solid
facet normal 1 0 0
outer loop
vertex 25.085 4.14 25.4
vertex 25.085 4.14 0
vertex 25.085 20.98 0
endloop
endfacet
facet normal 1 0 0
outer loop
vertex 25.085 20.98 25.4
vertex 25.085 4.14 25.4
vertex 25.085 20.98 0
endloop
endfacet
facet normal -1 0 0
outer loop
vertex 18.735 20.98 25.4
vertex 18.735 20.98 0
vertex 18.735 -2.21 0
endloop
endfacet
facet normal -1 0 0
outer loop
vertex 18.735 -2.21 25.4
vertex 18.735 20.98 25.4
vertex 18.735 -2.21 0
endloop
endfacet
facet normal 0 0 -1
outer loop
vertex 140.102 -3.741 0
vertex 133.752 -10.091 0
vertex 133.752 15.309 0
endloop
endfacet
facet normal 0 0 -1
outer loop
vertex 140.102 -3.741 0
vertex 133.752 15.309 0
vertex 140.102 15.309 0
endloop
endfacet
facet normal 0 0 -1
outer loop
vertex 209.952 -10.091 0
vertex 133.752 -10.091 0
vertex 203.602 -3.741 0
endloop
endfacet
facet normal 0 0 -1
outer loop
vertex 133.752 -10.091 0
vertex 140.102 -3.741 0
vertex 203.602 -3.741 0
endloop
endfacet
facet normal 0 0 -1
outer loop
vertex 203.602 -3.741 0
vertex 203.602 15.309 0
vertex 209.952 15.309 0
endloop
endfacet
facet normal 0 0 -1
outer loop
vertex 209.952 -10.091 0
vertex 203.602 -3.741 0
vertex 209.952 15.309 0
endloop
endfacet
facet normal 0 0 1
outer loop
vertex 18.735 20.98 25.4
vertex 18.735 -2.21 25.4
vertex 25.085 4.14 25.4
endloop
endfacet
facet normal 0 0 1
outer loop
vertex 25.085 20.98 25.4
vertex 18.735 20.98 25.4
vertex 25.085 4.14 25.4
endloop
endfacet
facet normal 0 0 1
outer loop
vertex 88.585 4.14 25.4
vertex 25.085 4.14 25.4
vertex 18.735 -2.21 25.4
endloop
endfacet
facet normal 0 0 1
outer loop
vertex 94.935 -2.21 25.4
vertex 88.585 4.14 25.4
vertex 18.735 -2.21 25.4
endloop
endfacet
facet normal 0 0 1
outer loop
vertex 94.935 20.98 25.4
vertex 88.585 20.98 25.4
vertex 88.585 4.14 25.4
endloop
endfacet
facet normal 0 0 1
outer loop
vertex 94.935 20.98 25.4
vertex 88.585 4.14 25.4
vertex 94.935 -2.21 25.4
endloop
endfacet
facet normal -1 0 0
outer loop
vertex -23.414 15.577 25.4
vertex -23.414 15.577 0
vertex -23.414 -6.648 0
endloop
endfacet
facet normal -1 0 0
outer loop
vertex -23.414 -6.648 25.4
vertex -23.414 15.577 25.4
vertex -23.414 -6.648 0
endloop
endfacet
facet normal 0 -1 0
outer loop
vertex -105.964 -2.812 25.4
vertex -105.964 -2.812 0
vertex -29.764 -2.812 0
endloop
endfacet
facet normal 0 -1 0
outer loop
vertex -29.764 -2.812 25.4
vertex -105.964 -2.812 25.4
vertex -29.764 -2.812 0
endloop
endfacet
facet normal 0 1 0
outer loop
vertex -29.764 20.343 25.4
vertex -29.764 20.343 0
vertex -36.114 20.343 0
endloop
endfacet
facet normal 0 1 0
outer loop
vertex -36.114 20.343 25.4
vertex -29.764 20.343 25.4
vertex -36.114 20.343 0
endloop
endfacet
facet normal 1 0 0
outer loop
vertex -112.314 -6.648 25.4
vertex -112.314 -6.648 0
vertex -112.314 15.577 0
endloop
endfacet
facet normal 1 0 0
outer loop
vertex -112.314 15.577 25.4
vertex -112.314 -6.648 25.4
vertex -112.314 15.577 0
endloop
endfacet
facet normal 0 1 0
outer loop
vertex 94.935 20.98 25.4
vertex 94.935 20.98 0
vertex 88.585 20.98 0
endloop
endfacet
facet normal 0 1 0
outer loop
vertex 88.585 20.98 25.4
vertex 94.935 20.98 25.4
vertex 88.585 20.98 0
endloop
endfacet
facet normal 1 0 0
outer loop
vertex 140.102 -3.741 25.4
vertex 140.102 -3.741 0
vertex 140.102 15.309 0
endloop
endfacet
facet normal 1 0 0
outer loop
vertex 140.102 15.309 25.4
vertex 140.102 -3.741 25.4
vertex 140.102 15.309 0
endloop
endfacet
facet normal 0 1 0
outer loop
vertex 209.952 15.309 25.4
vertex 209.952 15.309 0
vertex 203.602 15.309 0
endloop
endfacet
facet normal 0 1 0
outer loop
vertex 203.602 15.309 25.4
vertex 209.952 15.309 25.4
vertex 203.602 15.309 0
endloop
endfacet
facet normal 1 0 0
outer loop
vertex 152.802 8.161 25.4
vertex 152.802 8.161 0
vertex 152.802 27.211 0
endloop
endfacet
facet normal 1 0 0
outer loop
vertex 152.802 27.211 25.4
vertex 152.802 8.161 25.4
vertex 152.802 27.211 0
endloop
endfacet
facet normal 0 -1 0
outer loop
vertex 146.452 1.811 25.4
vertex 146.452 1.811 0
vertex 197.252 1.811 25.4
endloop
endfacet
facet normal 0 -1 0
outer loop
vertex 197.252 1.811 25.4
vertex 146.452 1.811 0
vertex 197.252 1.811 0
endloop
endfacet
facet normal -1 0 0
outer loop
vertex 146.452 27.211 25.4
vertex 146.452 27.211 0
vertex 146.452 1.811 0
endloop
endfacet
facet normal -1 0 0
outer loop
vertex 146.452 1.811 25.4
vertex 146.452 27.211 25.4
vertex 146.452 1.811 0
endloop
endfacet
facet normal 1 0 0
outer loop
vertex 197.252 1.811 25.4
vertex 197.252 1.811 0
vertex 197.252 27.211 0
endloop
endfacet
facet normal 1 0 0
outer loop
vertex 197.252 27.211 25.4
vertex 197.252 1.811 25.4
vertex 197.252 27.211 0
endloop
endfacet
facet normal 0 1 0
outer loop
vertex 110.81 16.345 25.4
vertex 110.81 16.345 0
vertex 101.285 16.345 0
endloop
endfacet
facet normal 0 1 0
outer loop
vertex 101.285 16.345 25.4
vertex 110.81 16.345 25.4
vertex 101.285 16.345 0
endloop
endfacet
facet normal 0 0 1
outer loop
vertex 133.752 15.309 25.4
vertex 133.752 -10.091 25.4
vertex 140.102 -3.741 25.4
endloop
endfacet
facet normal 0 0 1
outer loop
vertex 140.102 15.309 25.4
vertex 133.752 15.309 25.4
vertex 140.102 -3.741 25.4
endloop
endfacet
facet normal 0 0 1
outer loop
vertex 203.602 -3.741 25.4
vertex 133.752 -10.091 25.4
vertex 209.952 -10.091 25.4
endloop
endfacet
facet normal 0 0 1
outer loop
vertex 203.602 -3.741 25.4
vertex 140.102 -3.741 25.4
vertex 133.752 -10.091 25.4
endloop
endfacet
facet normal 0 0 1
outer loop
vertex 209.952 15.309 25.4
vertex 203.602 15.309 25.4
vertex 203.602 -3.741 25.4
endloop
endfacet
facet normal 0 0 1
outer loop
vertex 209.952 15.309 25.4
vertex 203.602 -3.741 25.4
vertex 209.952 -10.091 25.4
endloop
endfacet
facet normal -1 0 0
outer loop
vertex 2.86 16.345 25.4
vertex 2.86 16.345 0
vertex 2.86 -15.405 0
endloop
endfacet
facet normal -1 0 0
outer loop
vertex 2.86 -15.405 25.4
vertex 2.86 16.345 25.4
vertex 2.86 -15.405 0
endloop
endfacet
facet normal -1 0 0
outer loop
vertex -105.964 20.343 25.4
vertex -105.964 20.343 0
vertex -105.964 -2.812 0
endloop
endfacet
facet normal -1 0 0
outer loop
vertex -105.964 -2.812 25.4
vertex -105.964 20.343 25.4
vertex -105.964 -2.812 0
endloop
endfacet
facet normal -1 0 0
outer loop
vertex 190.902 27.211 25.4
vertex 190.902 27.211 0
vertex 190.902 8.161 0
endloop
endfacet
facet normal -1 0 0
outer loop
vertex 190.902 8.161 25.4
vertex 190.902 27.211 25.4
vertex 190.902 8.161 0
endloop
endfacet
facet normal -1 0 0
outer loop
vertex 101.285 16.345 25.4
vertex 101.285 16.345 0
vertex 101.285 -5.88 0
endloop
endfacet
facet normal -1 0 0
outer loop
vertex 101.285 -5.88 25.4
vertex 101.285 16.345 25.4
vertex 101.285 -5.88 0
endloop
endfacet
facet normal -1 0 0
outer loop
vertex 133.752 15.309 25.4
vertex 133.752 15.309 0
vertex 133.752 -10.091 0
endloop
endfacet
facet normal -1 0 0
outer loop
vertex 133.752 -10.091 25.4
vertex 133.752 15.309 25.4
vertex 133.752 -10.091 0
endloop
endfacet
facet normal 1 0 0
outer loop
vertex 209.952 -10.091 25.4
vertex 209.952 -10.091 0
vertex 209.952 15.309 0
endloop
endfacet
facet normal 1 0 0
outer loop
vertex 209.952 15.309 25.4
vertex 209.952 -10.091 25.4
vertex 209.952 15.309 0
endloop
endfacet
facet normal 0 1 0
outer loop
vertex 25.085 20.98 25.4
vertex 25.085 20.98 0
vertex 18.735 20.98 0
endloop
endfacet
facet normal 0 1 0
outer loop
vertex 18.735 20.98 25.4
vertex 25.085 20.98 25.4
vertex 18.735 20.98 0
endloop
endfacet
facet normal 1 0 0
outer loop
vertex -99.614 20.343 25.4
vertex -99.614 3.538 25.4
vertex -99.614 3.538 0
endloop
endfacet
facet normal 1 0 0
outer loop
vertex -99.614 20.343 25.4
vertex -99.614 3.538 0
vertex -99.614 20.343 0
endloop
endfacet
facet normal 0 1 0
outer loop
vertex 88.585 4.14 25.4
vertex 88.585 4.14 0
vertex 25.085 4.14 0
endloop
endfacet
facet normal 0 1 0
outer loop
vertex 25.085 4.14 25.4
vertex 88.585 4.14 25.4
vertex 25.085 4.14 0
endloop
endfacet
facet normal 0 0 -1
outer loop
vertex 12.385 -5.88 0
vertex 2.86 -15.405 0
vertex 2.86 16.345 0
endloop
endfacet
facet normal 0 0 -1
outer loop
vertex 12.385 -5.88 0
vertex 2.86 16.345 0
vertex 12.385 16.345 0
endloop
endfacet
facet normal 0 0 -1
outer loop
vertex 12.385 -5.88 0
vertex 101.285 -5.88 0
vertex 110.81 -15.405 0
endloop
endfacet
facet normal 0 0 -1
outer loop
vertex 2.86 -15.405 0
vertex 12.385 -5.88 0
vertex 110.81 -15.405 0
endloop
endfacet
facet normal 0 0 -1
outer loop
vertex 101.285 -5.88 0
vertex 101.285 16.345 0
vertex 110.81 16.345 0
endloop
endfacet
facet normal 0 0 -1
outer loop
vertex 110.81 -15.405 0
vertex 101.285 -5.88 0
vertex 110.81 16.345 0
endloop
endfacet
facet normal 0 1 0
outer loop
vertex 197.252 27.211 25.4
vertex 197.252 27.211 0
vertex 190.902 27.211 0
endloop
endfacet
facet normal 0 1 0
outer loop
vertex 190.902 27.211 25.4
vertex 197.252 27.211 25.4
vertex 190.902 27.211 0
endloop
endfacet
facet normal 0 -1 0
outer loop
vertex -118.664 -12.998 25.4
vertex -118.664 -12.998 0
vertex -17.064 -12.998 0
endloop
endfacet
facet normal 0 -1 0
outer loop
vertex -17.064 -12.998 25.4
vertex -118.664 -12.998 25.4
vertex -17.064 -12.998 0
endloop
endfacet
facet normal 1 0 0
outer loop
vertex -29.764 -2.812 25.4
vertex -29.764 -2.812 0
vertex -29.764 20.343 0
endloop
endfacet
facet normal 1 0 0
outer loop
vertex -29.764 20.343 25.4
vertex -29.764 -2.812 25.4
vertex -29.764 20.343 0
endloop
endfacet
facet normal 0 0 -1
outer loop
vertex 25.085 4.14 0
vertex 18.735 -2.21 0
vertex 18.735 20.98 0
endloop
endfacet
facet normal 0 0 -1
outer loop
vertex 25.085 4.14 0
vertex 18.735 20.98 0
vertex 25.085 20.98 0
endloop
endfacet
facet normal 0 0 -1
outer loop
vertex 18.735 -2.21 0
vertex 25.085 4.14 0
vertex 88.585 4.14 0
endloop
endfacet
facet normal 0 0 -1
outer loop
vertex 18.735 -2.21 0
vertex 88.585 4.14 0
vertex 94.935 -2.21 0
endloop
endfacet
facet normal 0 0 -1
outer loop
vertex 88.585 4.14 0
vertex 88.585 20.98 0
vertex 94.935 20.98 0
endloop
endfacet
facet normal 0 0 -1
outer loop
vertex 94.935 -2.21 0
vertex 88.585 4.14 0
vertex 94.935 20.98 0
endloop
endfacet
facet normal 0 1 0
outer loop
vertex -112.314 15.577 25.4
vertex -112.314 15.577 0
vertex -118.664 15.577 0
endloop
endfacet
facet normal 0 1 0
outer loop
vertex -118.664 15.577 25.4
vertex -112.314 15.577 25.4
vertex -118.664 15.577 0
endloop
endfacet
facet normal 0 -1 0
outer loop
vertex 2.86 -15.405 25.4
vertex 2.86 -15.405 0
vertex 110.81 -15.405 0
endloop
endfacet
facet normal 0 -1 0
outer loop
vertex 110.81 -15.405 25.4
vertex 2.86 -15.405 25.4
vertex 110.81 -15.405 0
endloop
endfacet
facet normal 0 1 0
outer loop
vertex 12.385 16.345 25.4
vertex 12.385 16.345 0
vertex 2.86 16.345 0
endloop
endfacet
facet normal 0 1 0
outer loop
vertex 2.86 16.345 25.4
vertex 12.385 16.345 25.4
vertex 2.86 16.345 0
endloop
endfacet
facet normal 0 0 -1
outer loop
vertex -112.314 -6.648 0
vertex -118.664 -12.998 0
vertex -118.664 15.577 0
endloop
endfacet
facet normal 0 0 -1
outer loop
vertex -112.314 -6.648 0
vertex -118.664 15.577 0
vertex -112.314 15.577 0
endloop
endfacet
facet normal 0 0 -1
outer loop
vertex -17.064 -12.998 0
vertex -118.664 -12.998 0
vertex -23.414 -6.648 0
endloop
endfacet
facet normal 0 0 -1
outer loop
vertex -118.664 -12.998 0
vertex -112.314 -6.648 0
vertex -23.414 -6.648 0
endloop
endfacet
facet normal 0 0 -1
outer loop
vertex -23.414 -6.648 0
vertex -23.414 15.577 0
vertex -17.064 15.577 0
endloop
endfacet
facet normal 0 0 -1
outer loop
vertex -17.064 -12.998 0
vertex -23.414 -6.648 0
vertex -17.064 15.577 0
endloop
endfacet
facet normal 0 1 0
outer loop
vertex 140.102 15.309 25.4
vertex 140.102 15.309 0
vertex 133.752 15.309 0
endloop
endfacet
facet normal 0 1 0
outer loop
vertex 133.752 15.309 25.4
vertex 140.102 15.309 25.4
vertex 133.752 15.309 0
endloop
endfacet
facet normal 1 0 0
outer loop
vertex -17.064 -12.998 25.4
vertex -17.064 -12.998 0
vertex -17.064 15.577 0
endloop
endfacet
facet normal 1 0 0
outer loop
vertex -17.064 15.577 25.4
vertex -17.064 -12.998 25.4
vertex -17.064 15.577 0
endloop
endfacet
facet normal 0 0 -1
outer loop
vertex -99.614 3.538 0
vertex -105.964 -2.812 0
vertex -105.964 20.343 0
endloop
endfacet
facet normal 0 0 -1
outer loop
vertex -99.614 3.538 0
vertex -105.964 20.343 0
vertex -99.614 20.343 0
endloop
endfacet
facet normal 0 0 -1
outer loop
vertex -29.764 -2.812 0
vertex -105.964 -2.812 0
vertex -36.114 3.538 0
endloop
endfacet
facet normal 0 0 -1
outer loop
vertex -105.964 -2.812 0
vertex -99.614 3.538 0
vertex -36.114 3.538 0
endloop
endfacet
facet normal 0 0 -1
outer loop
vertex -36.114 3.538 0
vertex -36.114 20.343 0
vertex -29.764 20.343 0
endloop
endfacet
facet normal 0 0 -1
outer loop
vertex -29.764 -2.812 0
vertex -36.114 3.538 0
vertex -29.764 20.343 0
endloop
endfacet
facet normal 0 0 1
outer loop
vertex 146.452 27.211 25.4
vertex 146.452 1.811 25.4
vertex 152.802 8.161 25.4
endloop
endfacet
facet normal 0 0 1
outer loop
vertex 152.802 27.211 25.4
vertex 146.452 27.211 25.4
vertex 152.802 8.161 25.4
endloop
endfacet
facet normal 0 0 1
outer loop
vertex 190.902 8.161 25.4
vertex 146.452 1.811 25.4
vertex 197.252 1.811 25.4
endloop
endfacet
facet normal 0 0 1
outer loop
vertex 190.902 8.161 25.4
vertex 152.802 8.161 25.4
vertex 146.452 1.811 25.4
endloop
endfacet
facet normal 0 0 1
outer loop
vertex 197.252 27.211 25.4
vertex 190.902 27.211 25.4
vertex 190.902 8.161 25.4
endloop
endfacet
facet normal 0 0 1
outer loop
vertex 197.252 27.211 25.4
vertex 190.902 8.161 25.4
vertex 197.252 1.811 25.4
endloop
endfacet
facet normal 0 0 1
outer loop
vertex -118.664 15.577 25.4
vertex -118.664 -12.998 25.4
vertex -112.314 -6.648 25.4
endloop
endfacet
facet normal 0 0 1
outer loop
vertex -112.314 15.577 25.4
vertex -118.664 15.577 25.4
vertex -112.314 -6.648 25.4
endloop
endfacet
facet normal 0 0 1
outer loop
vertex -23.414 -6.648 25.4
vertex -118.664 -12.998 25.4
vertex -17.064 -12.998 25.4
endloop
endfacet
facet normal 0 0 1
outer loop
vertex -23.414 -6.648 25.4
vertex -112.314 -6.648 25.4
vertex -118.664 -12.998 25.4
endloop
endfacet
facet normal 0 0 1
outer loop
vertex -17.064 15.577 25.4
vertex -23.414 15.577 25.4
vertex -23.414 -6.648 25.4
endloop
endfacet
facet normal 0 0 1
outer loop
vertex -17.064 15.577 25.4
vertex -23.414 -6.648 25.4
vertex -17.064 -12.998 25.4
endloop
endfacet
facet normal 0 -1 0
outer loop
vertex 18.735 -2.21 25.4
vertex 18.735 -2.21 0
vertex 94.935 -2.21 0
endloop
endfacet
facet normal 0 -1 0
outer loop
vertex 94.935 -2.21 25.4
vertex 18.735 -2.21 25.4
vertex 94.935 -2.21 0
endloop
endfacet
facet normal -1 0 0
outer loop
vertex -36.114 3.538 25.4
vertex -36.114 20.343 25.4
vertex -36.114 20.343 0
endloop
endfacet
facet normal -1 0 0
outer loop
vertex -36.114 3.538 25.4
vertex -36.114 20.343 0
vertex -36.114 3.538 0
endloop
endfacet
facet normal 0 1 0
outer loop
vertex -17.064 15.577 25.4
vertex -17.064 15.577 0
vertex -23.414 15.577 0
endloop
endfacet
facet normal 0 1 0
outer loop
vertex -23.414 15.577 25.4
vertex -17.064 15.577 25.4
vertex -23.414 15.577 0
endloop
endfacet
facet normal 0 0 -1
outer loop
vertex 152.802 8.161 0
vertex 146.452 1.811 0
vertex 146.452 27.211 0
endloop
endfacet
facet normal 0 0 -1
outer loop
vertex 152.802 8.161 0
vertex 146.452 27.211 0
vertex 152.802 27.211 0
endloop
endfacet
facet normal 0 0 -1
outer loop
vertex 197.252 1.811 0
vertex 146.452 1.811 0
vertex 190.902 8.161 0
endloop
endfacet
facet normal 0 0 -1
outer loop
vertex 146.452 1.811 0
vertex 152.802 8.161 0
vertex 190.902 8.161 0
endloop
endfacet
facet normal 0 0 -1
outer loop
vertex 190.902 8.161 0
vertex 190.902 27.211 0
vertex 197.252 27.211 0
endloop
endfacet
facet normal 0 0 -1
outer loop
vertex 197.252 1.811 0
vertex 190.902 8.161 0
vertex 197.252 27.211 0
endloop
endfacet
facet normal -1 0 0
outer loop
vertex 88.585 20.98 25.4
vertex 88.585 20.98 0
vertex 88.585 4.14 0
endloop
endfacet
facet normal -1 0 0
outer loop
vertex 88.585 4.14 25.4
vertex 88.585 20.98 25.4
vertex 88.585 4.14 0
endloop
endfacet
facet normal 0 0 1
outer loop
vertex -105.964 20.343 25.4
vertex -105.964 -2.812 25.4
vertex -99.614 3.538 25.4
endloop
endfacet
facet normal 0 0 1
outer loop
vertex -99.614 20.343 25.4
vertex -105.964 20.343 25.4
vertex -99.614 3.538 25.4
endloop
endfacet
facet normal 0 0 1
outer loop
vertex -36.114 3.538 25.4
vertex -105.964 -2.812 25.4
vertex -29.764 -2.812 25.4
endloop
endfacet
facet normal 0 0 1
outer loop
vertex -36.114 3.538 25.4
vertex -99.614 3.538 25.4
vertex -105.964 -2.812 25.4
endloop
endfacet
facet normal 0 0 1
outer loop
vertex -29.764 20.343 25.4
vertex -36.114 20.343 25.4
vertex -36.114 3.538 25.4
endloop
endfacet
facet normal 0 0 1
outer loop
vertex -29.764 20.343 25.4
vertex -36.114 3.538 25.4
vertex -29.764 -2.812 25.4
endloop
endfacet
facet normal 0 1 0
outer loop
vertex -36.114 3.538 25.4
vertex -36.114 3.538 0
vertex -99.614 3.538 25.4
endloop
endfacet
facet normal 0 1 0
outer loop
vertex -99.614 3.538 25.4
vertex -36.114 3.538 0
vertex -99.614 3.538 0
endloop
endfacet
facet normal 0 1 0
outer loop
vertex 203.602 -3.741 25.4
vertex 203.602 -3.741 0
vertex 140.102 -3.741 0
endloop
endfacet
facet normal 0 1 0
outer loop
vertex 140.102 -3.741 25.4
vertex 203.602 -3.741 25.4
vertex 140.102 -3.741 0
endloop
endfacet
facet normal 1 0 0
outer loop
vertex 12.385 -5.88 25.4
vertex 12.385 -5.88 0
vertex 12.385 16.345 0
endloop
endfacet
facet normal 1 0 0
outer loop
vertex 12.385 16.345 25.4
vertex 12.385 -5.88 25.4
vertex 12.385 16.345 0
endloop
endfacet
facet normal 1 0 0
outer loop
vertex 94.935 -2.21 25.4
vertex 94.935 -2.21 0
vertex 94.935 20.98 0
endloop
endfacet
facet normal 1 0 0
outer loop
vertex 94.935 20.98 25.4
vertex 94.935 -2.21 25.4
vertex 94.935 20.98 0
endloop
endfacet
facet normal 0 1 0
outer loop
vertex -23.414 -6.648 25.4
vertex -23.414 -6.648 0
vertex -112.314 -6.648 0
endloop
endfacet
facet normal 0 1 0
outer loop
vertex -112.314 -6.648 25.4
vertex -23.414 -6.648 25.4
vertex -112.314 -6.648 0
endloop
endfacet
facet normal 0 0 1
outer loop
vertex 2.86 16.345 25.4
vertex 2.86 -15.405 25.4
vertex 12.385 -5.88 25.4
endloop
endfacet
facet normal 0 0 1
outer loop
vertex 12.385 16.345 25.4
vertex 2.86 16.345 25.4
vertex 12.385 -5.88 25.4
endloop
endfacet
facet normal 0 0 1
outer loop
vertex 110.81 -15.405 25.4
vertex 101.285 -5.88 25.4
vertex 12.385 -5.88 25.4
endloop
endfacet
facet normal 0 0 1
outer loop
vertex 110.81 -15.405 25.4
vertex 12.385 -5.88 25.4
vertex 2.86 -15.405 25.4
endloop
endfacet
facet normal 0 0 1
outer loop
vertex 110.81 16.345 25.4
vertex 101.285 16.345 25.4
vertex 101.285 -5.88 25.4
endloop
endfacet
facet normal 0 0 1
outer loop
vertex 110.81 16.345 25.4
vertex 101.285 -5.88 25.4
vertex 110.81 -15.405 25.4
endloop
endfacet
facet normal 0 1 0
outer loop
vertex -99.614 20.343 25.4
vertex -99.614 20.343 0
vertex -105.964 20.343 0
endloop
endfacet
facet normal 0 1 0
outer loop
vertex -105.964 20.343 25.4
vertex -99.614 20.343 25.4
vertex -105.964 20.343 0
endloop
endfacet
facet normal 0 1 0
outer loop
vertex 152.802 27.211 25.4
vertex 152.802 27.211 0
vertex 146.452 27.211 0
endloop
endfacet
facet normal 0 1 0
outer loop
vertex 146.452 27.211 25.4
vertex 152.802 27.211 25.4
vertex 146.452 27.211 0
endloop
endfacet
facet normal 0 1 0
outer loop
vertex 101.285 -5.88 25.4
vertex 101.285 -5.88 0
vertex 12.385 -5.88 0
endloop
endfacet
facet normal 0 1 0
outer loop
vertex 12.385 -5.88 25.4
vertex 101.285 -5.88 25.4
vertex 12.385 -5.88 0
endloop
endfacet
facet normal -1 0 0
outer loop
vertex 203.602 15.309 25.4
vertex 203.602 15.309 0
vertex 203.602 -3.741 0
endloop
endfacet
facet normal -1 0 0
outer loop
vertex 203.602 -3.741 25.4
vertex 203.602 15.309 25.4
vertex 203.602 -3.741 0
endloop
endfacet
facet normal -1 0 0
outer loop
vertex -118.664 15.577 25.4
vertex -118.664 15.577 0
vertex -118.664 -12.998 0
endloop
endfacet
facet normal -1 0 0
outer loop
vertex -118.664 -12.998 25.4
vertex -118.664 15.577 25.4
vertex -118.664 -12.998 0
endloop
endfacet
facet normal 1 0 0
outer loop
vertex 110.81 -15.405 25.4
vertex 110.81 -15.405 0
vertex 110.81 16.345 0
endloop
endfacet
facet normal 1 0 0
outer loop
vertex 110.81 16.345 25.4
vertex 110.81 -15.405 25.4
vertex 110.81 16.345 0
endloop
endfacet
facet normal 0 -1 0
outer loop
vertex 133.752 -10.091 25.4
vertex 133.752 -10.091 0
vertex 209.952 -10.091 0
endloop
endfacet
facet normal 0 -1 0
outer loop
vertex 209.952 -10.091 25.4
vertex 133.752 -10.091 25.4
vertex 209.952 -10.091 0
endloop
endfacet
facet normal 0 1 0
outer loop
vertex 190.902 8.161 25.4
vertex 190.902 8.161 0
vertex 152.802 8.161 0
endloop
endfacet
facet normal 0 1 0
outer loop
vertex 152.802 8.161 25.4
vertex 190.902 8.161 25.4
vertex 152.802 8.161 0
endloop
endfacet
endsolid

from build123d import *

# Parameters (mm, degrees)
F1_DEPTH = 25.4
F3_DEPTH = 25.4
F5_DEPTH = 25.4


with BuildPart() as f1:
    # F0 (on Top) → F1 (new body)
    with BuildSketch(Plane.XY):
        Polygon((-118.664154, 15.577486), (-118.664154, -12.997514), (-17.064154, -12.997514), (-17.064154, 15.577486), (-23.414154, 15.577486), (-23.414154, -6.647514), (-112.314154, -6.647514), (-112.314154, 15.577486), align=None)
        Polygon((-99.614154, 20.342877), (-105.964154, 20.342877), (-105.964154, -2.812021), (-29.764154, -2.812021), (-29.764154, 20.342877), (-36.114154, 20.342877), (-36.114154, 3.537979), (-99.614154, 3.537979), align=None)
    extrude(amount=F1_DEPTH)


with BuildPart() as f3:
    # F2 (on Top) → F3 (new body)
    with BuildSketch(Plane.XY):
        Polygon((12.384747, 16.344548), (2.859747, 16.344548), (2.859747, -15.405452), (110.809747, -15.405452), (110.809747, 16.344548), (101.284747, 16.344548), (101.284747, -5.880452), (12.384747, -5.880452), align=None)
        Polygon((25.084747, 20.97974), (18.734747, 20.97974), (18.734747, -2.210185), (94.934747, -2.210185), (94.934747, 20.97974), (88.584747, 20.97974), (88.584747, 4.139815), (25.084747, 4.139815), align=None)
    extrude(amount=F3_DEPTH)


with BuildPart() as f5:
    # F4 (on Top) → F5 (new body)
    with BuildSketch(Plane.XY):
        Polygon((140.102306, 15.308876), (133.752306, 15.308876), (133.752306, -10.091124), (209.952306, -10.091124), (209.952306, 15.308876), (203.602306, 15.308876), (203.602306, -3.741124), (140.102306, -3.741124), align=None)
        Polygon((152.802306, 27.21146), (146.452306, 27.21146), (146.452306, 1.81146), (197.252306, 1.81146), (197.252306, 27.21146), (190.902306, 27.21146), (190.902306, 8.16146), (152.802306, 8.16146), align=None)
    extrude(amount=F5_DEPTH)


solid = Compound([f1.part, f3.part, f5.part])
